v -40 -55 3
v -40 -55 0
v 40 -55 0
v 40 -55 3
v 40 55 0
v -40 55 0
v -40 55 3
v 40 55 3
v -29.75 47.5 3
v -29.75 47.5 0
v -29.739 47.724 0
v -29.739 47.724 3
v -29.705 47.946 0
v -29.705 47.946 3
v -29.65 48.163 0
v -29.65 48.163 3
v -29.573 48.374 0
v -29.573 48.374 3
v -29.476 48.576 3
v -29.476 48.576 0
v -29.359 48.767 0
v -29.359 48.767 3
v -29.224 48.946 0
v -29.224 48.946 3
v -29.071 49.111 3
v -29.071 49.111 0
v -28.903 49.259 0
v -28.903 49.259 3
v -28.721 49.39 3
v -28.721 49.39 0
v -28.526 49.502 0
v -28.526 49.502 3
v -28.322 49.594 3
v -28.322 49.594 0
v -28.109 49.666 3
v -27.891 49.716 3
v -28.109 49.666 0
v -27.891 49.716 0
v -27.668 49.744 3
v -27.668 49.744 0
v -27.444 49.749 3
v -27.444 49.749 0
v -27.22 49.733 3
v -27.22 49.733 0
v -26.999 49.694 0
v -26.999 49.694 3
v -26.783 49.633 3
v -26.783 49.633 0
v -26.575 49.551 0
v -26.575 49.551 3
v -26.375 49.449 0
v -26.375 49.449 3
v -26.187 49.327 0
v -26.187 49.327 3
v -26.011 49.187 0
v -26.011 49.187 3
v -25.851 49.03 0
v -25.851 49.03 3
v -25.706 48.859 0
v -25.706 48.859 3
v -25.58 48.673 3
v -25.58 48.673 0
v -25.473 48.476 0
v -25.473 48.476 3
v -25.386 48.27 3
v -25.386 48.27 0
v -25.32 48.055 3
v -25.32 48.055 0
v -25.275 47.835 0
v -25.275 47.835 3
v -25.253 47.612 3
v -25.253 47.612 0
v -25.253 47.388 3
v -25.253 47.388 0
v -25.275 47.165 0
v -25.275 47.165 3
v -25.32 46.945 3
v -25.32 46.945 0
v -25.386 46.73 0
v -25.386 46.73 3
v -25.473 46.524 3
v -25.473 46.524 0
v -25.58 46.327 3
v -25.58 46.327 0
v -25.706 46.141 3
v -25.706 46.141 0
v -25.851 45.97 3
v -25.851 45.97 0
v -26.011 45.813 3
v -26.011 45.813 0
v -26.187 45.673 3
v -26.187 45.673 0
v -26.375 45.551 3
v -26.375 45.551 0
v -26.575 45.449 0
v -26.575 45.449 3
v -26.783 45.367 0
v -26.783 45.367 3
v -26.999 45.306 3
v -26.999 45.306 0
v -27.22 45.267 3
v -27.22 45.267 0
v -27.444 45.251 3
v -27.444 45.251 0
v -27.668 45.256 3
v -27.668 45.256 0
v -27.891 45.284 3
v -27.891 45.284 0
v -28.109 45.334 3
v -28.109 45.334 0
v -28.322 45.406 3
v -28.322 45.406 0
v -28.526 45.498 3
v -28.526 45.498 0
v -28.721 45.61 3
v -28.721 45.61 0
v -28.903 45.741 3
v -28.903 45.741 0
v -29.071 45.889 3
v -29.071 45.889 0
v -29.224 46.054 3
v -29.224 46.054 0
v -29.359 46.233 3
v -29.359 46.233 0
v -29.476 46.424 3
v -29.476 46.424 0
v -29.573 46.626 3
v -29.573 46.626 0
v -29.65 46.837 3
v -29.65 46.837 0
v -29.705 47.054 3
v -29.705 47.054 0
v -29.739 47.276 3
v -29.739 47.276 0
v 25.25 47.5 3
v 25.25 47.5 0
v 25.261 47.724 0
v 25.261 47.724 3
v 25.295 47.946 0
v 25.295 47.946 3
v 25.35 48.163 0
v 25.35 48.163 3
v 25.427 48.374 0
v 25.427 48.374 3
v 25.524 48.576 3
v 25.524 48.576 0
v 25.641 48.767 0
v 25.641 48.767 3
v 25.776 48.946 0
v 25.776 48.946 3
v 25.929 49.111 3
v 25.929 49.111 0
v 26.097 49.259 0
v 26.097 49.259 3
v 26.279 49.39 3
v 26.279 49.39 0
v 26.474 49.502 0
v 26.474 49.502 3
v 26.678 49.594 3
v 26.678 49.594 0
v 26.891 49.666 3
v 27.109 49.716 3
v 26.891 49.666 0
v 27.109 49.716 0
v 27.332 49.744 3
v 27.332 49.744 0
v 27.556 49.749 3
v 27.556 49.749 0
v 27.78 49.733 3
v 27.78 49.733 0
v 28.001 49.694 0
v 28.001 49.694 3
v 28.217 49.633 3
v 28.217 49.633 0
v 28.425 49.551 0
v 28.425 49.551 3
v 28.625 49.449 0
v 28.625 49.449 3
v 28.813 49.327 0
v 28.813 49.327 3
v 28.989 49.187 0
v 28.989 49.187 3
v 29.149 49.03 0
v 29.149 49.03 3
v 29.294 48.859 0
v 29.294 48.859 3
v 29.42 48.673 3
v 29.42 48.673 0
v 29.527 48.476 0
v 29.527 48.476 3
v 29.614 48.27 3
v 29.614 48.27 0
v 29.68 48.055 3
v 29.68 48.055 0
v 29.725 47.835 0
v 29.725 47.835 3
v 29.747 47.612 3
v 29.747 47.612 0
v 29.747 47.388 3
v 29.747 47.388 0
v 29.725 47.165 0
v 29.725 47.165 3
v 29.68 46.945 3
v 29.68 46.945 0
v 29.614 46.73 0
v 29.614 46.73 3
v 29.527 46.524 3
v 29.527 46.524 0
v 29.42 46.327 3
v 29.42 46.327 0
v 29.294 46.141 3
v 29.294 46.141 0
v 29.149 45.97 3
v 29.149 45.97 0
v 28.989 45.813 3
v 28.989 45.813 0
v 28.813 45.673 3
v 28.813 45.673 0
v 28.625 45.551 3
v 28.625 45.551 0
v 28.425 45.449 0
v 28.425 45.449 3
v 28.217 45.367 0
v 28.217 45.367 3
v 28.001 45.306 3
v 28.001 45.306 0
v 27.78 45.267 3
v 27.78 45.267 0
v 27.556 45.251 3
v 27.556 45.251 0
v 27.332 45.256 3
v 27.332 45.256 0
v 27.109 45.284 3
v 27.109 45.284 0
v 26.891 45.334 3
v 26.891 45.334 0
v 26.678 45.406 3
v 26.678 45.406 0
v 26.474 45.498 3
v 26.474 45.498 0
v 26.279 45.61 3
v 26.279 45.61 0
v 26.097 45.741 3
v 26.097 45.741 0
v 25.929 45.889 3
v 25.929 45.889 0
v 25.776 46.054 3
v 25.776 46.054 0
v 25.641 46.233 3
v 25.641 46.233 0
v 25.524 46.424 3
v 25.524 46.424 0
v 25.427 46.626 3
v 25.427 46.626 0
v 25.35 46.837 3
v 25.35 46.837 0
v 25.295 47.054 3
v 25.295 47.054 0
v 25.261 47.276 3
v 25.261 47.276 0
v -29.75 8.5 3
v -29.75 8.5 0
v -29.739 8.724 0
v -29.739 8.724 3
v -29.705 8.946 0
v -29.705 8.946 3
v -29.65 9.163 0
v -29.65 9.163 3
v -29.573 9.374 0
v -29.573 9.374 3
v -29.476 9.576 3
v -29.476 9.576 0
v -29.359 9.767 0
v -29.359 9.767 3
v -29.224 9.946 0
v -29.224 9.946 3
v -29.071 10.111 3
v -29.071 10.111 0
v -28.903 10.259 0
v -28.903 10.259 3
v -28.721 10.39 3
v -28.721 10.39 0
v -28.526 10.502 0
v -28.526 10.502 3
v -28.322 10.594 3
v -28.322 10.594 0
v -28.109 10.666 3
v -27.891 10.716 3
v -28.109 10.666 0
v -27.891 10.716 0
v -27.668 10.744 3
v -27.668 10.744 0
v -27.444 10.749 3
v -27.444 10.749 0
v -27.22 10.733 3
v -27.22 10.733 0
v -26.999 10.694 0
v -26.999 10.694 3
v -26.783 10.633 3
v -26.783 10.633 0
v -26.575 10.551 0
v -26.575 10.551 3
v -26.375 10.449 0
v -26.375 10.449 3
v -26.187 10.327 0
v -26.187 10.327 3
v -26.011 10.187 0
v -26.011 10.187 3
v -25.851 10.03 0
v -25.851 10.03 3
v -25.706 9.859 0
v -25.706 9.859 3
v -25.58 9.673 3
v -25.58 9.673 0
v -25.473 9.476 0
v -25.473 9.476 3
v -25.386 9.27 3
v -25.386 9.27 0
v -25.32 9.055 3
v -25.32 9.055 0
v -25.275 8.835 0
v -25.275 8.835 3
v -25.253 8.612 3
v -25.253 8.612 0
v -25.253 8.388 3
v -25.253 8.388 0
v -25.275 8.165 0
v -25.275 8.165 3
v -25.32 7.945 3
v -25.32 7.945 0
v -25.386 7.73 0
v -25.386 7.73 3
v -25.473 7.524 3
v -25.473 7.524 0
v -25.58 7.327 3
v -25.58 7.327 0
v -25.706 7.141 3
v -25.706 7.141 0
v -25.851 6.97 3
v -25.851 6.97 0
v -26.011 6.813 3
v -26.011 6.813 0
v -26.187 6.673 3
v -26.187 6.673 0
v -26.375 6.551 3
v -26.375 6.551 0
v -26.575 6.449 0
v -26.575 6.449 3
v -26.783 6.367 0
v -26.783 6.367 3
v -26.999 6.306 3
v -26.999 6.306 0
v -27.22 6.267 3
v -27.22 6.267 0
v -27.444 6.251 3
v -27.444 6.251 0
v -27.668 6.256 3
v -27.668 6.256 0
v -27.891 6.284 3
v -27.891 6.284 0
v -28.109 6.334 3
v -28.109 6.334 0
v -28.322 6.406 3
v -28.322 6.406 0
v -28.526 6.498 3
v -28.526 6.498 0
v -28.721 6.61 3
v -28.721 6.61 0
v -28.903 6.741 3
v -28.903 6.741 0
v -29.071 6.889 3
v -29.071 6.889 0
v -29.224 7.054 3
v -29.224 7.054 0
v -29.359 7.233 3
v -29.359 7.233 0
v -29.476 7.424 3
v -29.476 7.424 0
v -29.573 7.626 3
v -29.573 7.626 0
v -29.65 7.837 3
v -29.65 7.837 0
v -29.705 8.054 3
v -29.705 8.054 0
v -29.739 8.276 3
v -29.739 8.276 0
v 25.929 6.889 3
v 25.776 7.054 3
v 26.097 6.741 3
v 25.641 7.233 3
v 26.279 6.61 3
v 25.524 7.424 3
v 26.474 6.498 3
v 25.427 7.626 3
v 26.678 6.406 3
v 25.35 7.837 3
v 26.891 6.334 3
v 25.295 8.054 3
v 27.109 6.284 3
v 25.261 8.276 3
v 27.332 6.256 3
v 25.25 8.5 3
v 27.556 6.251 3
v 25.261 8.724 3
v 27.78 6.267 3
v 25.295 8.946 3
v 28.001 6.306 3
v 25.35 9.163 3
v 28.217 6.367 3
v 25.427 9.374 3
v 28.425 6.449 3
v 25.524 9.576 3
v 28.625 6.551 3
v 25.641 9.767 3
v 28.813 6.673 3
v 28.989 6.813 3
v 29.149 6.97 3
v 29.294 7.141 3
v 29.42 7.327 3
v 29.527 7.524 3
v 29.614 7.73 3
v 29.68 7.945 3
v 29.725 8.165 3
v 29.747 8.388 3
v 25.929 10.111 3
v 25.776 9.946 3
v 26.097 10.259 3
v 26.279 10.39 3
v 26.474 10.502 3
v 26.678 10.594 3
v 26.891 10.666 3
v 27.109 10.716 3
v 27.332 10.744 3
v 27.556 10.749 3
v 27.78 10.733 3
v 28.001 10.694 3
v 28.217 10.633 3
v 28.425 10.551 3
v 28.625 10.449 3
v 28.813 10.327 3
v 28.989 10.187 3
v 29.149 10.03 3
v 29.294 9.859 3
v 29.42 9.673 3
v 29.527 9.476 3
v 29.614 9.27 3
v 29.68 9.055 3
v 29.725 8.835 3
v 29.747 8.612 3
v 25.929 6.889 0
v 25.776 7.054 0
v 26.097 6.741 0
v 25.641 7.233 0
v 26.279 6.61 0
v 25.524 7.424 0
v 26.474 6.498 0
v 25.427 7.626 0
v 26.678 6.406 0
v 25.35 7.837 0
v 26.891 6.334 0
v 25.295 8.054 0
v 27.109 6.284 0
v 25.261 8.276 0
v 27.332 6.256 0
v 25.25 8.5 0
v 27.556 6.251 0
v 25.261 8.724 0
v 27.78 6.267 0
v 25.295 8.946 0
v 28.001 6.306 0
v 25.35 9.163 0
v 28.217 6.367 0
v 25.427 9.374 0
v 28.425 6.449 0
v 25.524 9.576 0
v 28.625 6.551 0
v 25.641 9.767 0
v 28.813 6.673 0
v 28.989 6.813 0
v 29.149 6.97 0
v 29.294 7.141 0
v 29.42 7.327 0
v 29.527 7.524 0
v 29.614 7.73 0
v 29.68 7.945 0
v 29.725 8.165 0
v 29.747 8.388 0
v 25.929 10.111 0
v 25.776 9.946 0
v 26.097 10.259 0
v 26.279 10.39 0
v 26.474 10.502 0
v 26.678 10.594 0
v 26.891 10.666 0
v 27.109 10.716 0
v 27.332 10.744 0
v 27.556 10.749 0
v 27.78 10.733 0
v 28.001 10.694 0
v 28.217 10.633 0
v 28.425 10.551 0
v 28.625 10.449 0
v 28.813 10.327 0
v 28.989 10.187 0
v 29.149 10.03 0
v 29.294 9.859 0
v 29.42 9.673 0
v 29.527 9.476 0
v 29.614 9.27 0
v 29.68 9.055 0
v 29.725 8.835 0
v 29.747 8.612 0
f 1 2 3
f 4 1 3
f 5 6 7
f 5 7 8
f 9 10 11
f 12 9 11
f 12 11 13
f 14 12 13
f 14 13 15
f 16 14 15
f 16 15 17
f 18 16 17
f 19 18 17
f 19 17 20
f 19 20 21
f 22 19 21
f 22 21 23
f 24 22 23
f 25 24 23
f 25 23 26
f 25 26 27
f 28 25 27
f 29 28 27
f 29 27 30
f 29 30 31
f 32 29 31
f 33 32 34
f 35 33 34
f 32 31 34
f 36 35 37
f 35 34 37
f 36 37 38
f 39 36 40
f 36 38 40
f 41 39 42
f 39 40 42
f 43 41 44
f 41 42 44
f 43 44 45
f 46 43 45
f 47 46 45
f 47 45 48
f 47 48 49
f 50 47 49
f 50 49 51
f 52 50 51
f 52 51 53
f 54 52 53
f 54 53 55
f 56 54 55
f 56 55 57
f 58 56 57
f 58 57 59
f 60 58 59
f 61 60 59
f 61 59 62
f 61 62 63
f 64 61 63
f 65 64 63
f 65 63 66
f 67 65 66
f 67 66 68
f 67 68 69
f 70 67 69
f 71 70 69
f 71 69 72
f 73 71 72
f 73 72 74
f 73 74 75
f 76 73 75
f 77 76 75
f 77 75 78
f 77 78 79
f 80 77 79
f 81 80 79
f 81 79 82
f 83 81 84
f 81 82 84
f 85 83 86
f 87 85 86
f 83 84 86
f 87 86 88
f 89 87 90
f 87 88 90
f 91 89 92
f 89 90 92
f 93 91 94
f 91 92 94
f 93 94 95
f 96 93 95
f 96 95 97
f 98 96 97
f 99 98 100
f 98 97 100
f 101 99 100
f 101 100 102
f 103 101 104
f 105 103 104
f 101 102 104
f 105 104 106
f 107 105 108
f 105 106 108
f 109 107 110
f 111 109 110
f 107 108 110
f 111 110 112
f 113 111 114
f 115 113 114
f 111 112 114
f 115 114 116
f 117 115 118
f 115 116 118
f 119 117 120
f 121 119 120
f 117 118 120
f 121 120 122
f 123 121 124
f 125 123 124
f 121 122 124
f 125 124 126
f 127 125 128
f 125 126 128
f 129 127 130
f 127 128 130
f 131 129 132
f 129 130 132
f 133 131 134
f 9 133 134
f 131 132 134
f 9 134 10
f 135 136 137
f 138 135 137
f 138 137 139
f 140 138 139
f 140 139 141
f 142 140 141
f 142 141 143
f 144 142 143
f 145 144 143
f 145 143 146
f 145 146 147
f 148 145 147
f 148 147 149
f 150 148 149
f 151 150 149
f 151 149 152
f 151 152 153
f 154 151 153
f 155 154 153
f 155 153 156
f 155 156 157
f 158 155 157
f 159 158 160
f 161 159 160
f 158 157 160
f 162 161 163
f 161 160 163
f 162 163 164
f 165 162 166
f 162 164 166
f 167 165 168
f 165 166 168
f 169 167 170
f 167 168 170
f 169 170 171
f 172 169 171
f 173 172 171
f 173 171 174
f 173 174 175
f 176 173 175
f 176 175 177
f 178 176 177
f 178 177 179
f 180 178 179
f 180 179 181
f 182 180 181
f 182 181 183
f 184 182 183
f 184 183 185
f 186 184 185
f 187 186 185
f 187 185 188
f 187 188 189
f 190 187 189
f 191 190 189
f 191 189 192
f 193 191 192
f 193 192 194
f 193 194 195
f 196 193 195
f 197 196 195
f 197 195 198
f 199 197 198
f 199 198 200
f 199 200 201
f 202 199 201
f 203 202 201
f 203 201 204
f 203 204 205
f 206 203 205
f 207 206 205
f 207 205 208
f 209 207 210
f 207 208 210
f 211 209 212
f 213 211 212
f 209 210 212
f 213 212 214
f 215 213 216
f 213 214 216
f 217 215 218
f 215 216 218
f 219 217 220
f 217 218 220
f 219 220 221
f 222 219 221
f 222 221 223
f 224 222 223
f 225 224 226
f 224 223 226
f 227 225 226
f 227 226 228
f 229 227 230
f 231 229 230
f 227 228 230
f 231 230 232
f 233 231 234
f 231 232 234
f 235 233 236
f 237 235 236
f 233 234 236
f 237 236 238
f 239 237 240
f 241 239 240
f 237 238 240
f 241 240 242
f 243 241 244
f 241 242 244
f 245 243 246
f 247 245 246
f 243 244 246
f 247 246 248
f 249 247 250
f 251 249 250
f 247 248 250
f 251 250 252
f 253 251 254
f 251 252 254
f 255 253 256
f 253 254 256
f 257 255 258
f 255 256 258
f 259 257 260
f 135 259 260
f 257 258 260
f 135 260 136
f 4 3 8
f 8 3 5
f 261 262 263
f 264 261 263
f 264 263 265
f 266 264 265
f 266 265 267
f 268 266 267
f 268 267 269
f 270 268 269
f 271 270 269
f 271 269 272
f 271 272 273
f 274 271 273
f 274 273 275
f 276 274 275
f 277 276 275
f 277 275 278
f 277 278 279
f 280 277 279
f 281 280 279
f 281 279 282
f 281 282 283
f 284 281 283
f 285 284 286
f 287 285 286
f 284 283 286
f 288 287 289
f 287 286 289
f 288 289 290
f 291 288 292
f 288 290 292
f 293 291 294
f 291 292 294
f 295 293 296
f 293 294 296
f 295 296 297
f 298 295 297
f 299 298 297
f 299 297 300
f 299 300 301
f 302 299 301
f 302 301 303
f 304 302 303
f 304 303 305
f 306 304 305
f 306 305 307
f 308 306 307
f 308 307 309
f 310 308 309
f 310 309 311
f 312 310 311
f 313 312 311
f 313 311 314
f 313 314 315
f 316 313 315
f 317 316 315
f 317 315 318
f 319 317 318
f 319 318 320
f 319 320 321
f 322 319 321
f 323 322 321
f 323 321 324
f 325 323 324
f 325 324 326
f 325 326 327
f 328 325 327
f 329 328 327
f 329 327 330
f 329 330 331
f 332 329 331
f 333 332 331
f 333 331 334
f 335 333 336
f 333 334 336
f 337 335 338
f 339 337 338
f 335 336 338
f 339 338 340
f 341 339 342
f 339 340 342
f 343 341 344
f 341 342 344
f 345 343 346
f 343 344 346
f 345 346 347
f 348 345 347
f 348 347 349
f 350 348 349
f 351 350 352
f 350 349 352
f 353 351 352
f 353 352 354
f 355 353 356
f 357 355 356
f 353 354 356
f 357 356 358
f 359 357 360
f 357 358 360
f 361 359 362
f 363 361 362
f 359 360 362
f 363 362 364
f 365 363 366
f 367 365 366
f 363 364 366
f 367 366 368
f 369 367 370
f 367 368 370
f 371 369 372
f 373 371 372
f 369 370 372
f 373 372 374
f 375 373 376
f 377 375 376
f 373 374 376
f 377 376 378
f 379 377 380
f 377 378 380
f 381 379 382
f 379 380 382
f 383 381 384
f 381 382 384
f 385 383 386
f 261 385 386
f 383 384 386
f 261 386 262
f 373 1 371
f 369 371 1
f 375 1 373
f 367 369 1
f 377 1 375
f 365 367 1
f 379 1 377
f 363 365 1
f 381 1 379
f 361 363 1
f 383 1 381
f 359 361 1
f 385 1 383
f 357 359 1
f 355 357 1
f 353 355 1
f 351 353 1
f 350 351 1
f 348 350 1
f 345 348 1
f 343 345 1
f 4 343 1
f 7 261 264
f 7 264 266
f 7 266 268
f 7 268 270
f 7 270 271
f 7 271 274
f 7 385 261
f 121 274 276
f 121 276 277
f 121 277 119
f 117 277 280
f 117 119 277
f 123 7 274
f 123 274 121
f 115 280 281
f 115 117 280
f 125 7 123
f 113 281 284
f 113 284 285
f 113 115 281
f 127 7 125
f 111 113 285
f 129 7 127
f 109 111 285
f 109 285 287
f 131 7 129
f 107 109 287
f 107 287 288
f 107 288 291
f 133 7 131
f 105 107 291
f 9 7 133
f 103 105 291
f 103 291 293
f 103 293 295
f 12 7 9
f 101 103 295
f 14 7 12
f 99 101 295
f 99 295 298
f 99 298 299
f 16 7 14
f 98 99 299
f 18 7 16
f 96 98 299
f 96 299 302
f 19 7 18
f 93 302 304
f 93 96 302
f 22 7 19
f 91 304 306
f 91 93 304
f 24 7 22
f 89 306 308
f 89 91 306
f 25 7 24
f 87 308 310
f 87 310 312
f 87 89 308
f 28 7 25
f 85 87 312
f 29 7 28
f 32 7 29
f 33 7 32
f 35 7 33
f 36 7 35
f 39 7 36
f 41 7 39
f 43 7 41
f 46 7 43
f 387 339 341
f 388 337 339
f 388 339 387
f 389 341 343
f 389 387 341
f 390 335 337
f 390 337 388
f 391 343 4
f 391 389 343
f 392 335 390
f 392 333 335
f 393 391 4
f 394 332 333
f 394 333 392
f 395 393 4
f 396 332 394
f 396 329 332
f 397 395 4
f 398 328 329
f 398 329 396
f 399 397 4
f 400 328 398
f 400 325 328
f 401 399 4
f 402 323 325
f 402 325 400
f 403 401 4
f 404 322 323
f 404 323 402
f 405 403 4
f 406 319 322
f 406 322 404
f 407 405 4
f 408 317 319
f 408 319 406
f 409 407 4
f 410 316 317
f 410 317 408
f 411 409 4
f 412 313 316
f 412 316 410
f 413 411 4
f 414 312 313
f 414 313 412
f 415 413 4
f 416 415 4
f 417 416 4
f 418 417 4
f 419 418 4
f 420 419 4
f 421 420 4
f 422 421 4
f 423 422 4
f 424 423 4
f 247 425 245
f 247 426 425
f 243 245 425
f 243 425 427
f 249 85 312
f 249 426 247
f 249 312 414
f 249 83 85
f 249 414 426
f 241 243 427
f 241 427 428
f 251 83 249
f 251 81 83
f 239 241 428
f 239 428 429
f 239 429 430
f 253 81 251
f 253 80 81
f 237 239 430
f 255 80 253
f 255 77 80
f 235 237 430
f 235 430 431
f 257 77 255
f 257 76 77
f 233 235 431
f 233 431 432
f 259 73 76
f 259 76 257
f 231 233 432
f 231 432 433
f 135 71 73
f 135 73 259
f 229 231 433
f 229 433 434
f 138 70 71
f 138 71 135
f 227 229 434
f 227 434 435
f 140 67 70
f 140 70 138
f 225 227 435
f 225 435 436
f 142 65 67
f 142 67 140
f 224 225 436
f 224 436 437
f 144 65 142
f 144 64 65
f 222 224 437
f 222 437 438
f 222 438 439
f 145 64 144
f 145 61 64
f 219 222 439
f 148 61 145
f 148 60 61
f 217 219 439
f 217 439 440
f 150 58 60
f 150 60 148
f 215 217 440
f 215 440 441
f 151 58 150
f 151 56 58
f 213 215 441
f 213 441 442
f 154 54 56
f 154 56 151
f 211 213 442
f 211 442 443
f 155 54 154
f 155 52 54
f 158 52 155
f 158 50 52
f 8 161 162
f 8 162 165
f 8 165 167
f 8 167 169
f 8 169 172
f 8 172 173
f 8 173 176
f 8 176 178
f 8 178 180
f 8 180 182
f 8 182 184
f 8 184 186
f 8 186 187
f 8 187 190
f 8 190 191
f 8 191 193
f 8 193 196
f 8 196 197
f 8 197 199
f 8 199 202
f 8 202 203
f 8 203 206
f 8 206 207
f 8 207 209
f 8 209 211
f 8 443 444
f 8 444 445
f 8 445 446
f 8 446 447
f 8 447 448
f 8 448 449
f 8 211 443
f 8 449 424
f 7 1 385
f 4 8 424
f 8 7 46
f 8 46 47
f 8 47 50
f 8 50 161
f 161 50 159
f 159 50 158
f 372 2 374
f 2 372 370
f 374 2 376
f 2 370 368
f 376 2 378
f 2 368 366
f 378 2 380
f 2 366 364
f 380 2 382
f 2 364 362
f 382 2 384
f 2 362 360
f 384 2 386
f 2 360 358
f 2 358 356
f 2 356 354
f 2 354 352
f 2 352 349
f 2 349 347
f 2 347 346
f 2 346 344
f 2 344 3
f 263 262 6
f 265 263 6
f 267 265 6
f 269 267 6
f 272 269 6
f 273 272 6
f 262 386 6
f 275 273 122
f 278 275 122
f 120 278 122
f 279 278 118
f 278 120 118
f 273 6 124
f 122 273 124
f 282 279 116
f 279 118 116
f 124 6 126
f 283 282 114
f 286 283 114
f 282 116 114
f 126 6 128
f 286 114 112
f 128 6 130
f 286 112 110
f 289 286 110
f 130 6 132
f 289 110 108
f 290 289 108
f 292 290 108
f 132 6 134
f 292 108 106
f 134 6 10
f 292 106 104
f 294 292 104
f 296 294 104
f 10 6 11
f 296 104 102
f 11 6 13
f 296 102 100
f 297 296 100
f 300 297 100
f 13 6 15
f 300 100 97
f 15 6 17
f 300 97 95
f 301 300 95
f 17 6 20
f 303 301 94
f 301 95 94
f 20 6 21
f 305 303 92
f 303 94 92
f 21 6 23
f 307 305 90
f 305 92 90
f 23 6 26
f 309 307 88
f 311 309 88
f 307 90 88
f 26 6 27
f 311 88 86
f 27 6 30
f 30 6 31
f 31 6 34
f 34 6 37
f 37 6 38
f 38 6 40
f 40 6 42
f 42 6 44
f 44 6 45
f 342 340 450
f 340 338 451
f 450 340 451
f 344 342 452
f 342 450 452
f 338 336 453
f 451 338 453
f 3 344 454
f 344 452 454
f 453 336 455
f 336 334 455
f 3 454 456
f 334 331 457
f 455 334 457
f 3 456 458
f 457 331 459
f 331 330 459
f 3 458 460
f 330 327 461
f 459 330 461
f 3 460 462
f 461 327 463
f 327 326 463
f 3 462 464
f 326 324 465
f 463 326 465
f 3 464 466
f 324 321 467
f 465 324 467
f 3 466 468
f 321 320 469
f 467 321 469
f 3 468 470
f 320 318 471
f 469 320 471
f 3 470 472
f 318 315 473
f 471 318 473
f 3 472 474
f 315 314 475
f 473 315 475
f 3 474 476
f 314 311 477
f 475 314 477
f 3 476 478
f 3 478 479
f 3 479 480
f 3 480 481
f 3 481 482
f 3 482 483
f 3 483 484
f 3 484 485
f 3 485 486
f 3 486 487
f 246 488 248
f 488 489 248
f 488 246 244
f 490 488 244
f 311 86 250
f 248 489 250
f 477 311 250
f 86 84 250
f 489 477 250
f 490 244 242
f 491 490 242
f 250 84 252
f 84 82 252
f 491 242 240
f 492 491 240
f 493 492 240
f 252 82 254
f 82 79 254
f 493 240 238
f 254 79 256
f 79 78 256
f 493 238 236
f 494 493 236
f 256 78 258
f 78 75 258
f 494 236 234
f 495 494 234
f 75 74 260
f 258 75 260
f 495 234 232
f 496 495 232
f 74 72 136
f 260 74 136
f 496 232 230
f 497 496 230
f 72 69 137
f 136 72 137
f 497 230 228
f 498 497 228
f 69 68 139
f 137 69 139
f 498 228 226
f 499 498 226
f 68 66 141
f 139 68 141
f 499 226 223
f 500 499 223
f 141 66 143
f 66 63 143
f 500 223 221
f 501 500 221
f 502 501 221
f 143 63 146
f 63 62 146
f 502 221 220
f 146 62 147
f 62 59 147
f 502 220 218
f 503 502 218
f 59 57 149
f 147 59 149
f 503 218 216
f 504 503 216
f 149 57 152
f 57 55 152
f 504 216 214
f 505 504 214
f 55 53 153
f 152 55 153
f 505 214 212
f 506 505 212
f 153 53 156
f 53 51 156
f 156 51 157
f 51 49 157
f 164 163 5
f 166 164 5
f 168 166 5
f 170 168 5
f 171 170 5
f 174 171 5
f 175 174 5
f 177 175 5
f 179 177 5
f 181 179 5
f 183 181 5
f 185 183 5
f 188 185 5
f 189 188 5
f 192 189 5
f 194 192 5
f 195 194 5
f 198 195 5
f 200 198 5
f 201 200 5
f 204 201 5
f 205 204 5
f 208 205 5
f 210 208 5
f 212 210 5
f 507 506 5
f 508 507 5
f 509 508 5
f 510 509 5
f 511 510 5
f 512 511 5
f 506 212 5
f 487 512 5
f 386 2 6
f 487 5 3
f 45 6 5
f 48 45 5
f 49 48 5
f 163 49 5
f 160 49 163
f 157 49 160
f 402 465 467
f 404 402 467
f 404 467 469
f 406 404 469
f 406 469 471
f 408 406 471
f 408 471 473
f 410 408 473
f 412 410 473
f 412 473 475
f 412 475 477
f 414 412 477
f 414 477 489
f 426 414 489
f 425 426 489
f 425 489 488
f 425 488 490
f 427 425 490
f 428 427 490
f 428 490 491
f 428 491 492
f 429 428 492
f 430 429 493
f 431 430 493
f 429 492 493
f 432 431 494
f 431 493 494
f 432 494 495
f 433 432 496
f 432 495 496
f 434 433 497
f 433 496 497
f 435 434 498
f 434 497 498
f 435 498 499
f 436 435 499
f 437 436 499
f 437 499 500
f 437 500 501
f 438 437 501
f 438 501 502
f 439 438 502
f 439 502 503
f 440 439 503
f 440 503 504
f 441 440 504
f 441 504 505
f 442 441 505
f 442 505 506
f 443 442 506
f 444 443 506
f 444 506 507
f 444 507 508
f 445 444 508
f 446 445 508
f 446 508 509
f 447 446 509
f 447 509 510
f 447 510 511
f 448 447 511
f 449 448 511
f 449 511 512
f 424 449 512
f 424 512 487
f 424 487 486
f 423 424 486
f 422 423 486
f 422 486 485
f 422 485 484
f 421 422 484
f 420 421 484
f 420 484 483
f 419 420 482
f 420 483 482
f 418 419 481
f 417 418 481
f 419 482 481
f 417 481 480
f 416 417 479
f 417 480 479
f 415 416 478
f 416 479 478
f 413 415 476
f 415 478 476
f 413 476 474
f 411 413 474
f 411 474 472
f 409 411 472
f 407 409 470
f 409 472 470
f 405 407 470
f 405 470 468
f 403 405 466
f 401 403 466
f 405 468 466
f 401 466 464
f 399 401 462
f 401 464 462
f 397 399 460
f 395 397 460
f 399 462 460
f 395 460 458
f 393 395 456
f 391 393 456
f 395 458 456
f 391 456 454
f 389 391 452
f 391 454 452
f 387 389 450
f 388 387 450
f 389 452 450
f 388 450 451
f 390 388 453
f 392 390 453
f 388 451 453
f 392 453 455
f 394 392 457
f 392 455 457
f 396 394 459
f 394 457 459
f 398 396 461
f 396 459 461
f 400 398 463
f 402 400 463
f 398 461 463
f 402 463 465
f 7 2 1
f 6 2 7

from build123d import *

# Parameters (mm, degrees)
SKETCH1_W           = 80
SKETCH1_H           = 110
BOSS_EXTRUDE1_DEPTH = 3
D_GAGEMENT_M41_D    = 4.5


with BuildPart() as part:
    # Sketch1 → Boss-Extrude1 (new body)
    with BuildSketch(Plane.XY):
        Rectangle(SKETCH1_W, SKETCH1_H)
    extrude(amount=BOSS_EXTRUDE1_DEPTH)

    # Dégagement M41 (through all)
    with Locations(Plane.XY.offset(3)):
        with Locations((27.50000229, 47.500001598), (27.50000229, 8.500001598), (-27.49999771, 8.500001598), (-27.49999771, 47.500001598)):
            Hole(D_GAGEMENT_M41_D / 2)


solid = part.part
